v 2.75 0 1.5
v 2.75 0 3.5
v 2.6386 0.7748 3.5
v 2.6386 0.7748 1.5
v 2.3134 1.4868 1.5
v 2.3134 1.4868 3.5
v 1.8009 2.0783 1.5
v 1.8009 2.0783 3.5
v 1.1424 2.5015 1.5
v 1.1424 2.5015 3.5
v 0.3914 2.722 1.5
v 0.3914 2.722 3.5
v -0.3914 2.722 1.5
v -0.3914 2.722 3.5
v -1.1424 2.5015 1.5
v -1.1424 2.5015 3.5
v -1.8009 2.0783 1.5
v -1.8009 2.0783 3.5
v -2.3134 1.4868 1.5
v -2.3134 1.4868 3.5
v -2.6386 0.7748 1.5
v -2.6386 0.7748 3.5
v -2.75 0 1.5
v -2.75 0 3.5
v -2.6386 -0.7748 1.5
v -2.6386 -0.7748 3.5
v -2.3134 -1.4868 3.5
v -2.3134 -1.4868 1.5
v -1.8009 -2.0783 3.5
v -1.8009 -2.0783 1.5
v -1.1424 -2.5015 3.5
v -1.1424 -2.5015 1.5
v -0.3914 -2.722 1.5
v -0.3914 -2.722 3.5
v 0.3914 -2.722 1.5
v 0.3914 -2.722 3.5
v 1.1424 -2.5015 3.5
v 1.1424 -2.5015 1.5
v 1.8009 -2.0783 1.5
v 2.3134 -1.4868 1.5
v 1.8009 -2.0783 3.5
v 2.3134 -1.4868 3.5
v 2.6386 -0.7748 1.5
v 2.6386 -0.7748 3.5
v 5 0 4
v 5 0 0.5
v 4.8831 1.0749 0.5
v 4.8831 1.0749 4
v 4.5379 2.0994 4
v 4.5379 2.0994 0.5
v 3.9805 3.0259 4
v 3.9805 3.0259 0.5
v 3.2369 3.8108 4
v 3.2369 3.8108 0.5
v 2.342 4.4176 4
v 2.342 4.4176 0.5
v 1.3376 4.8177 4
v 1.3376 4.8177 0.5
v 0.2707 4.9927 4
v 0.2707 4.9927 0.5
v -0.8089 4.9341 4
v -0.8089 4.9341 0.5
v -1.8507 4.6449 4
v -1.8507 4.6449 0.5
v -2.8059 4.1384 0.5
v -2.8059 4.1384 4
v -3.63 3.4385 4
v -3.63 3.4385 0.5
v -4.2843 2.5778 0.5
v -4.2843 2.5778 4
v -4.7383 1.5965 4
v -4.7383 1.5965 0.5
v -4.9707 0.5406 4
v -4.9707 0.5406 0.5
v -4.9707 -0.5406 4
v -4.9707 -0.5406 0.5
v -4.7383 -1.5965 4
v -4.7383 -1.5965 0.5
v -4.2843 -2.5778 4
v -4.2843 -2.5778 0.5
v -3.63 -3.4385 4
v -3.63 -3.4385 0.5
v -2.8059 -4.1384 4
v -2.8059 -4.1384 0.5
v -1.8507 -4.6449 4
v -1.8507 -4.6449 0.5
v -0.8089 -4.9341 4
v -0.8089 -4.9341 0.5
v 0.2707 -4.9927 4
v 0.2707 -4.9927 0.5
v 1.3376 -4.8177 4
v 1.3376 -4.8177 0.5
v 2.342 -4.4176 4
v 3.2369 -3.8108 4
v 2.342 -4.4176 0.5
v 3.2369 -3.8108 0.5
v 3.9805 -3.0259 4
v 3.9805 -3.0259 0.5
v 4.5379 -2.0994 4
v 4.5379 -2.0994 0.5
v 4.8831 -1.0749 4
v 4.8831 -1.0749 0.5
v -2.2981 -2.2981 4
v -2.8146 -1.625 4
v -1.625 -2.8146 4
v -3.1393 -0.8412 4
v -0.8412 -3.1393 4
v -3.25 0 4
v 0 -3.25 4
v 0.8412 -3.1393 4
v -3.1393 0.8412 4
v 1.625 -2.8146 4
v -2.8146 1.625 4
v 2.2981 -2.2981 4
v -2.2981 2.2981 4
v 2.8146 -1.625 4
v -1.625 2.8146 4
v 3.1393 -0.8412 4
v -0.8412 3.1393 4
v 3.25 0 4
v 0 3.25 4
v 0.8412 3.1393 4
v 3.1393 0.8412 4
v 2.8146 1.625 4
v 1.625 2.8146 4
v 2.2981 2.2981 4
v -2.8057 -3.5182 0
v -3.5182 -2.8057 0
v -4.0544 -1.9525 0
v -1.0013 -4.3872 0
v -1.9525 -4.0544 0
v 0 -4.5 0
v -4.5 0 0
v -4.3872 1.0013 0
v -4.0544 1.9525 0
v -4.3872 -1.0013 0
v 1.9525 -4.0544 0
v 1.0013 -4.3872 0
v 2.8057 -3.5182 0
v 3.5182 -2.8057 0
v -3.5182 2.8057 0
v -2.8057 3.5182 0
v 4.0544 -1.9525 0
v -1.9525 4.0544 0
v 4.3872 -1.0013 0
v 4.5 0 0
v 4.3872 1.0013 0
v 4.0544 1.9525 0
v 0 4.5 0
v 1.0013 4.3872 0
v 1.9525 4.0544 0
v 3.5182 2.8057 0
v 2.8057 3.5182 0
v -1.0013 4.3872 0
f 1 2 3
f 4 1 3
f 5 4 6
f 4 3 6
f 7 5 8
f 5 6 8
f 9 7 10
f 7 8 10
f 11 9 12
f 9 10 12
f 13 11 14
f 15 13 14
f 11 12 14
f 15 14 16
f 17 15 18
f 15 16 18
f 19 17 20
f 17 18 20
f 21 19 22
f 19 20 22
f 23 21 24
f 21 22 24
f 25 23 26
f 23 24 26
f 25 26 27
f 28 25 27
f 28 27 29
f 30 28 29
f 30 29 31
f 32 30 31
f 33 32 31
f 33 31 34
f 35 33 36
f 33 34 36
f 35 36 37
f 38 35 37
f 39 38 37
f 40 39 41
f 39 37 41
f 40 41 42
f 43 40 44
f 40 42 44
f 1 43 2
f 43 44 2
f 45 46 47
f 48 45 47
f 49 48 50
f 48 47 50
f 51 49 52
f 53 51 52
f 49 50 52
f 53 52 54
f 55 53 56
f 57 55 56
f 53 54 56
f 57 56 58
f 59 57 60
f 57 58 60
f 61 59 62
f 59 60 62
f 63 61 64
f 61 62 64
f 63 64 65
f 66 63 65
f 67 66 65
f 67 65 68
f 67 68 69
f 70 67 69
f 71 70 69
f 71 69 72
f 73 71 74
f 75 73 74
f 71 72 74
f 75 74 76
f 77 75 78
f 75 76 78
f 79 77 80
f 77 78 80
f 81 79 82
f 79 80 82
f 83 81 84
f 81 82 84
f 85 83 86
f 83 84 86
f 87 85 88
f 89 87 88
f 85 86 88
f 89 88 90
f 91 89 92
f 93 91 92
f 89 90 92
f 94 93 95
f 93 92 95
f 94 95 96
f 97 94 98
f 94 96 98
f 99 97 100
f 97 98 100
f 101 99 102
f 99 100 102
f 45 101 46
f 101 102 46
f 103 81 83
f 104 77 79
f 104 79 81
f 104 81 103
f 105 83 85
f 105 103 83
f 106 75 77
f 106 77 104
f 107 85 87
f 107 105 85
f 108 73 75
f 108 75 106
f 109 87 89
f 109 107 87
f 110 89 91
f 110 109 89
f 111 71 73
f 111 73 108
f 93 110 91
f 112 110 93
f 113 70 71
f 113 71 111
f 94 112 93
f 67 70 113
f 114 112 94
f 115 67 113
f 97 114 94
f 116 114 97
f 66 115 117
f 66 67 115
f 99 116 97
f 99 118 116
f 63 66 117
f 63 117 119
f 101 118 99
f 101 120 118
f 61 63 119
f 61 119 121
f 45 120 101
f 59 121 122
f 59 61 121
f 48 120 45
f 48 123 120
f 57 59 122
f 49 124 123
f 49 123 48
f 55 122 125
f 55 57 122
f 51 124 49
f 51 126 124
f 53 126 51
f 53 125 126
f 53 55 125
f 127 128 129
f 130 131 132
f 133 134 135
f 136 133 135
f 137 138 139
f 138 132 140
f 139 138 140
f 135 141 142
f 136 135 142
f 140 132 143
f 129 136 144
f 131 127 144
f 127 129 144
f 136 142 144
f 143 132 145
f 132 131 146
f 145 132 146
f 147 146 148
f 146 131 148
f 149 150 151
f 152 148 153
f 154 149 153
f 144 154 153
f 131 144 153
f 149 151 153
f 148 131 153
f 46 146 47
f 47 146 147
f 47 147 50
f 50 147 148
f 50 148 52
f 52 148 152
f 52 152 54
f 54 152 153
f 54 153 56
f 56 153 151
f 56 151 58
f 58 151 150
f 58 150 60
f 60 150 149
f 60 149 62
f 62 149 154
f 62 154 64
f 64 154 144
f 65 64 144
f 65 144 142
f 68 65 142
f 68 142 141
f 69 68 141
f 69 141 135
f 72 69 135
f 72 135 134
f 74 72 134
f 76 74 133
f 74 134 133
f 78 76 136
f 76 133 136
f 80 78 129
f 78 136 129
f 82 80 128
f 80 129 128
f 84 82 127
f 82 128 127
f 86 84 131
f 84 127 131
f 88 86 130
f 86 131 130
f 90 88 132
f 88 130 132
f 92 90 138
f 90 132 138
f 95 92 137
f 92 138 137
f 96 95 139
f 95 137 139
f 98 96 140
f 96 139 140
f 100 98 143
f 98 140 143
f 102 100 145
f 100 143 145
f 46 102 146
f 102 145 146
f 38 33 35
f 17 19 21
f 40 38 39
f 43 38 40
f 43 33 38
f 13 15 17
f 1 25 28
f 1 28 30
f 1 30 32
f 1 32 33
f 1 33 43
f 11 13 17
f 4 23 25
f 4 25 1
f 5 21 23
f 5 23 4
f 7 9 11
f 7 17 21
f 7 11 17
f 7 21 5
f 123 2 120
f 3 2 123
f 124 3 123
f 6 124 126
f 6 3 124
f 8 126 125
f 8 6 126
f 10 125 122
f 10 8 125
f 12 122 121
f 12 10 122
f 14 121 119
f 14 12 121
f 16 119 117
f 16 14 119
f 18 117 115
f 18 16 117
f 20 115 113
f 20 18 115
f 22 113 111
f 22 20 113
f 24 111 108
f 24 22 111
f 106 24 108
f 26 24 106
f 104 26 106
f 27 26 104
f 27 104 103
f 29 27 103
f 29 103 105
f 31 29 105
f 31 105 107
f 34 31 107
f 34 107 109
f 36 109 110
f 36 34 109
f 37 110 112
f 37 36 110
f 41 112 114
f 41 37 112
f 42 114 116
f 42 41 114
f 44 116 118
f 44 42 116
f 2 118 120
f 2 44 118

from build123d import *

# Parameters (mm, degrees)
F0_R     = 5
F1_DEPTH = 4
F2_R     = 2.75
F3_DEPTH = 2.5
F4_SIZE  = 0.5


with BuildPart() as f1:
    # F0 (on Top) → F1 (new body)
    with BuildSketch(Plane.XY):
        Circle(F0_R)
    extrude(amount=F1_DEPTH)

    # F2 (on face) → F3 (cut)
    with BuildSketch(Plane.XY.offset(4)):
        Circle(F2_R)
    extrude(amount=-F3_DEPTH, mode=Mode.SUBTRACT)

    # F4
    f4_edges = [f1.edges().sort_by_distance(p)[0] for p in [
        (-2.75, 0, 4),
        (-5, 0, 0),
    ]]
    chamfer(f4_edges, length=F4_SIZE)


solid = f1.part
